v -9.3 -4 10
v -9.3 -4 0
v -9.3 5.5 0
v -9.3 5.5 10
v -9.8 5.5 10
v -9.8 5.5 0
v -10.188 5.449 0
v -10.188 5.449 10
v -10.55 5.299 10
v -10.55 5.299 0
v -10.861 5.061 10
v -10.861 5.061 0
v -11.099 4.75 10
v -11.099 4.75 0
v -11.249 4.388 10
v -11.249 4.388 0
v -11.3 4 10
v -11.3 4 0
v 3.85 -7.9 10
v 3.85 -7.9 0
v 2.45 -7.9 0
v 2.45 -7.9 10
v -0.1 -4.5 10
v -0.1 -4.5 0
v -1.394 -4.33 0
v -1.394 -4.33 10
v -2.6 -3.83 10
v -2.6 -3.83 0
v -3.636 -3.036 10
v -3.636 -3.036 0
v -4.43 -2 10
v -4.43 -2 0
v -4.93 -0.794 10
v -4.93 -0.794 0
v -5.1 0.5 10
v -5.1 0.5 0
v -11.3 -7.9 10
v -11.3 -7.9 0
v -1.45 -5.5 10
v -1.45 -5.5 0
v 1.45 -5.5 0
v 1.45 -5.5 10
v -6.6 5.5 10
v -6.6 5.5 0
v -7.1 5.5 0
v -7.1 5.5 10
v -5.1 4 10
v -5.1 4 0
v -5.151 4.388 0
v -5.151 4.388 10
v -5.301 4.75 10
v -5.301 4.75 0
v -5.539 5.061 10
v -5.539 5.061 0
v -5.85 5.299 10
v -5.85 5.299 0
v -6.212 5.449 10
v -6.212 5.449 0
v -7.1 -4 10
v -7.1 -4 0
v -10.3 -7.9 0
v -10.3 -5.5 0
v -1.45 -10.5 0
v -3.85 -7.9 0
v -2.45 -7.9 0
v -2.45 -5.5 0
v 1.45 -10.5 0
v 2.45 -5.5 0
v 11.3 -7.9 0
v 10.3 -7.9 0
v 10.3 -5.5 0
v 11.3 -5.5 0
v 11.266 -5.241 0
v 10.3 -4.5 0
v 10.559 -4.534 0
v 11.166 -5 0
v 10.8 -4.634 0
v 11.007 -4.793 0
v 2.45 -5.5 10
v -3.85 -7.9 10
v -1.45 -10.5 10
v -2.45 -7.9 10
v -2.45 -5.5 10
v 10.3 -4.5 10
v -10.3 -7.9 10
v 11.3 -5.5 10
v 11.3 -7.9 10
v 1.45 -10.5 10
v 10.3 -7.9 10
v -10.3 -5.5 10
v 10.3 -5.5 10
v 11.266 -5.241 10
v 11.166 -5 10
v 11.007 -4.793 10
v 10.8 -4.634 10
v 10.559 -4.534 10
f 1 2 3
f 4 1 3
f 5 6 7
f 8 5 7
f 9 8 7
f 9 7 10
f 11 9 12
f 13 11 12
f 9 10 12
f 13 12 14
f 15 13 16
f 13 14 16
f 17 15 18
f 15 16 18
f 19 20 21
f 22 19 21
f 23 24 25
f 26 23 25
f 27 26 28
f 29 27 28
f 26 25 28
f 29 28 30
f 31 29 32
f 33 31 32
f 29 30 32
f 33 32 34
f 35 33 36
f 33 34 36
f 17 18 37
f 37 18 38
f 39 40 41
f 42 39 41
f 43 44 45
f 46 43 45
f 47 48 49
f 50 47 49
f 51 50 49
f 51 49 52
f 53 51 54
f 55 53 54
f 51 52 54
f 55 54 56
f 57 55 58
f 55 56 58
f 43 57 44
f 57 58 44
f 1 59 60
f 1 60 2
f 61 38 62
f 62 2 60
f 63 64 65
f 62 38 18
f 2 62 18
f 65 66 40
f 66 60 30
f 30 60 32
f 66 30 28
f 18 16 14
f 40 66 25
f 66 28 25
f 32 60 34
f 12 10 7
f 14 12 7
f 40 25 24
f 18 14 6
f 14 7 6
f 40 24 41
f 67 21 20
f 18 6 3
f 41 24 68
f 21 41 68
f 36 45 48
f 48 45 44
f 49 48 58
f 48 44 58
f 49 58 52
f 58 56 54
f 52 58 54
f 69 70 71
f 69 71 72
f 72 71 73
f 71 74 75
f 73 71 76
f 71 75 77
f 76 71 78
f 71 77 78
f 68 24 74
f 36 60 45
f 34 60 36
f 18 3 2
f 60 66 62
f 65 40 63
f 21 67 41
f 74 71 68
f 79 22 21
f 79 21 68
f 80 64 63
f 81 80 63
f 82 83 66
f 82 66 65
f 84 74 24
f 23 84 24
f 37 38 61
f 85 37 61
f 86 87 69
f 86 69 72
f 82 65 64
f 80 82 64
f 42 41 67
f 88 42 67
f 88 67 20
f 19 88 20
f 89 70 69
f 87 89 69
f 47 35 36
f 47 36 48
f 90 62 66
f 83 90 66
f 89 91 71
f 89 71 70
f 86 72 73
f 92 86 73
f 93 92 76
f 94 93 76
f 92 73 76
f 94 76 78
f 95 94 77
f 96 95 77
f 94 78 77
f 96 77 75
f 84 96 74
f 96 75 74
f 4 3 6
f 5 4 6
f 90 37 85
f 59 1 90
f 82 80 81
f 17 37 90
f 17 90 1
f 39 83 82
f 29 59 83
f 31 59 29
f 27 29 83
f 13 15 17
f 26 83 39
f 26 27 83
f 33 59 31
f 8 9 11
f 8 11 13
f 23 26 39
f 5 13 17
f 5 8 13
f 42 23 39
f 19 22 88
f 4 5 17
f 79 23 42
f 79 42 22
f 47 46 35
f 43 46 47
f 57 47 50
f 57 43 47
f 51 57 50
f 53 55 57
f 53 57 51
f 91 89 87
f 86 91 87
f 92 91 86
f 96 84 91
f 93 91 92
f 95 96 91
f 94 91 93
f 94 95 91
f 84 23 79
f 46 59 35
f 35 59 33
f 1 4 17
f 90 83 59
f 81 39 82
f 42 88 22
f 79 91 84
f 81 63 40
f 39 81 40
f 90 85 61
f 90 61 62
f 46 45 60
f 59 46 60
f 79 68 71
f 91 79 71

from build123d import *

# Parameters (mm, degrees)
F0_W     = 1
F0_H     = 2.4
F1_DEPTH = 10


# Not quite as in the source:
# - a feature names something its author has since deleted; it is built from what else it names


with BuildPart() as f1:
    # F0 (on Top) → F1 (new body)
    with BuildSketch(Plane.XY):
        with Locations((10.8, -6.7)):
            Rectangle(F0_W, F0_H)
        with Locations((-10.8, -6.7)):
            Rectangle(F0_W, F0_H)
        Polygon((-2.45, -8.5), (-2.45, -7.9), (-3.85, -7.9), (-1.45, -10.5), (-1.45, -8.5), align=None)
        with BuildLine():
            Line((10.3, -4.5), (10.3, -5.5))
            Line((10.3, -5.5), (11.3, -5.5))
            ThreePointArc((11.3, -5.5), (11.0071067812, -4.7928932188), (10.3, -4.5))
        make_face()
        Polygon((-1.45, -5.5), (-2.45, -5.5), (-2.45, -7.9), (-2.45, -8.5), (-1.45, -8.5), align=None)
        Polygon((2.45, -5.5), (1.45, -5.5), (1.45, -8.5), (2.45, -8.5), (2.45, -7.9), align=None)
        with BuildLine():
            Line((-11.3, -5.5), (-10.3, -5.5))
            Line((-10.3, -5.5), (-2.45, -5.5))
            Line((-2.45, -5.5), (-1.45, -5.5))
            Line((-1.45, -5.5), (1.45, -5.5))
            Line((1.45, -5.5), (2.45, -5.5))
            Line((2.45, -5.5), (10.3, -5.5))
            Line((10.3, -5.5), (10.3, -4.5))
            Line((10.3, -4.5), (-0.1, -4.5))
            ThreePointArc((-0.1, -4.5), (-3.6355339059, -3.0355339059), (-5.1, 0.5))
            Line((-5.1, 0.5), (-5.1, 4))
            ThreePointArc((-5.1, 4), (-5.5393398282, 5.0606601718), (-6.6, 5.5))
            Line((-6.6, 5.5), (-7.1, 5.5))
            Line((-7.1, 5.5), (-7.1, -4))
            Line((-7.1, -4), (-9.3, -4))
            Line((-9.3, -4), (-9.3, 5.5))
            Line((-9.3, 5.5), (-9.8, 5.5))
            ThreePointArc((-9.8, 5.5), (-10.8606601718, 5.0606601718), (-11.3, 4))
            Line((-11.3, 4), (-11.3, -5.5))
        make_face()
        Polygon((2.45, -8.5), (1.45, -8.5), (1.45, -10.5), (3.85, -7.9), (2.45, -7.9), align=None)
    extrude(amount=F1_DEPTH)


solid = f1.part
